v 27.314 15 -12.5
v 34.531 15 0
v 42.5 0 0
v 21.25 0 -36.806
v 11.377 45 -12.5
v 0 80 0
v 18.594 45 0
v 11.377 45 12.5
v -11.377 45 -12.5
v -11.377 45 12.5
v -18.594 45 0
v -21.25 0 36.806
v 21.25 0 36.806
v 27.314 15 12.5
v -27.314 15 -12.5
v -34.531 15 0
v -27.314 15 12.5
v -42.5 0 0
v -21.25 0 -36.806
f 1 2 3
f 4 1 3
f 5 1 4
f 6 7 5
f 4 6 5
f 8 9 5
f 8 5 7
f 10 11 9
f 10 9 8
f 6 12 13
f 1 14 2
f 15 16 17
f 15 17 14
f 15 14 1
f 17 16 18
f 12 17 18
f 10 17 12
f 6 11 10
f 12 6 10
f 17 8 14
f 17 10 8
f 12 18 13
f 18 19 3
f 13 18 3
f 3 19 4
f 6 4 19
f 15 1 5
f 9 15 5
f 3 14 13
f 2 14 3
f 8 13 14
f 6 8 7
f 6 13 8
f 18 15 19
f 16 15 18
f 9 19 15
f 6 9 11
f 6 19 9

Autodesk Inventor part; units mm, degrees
ref_plane "YZ Plane" through (0, 0, 0) normal (1, 0, 0) x (0, 1, 0)
ref_plane "XZ Plane" through (0, 0, 0) normal (0, 1, 0) x (-1, 0, 0)
ref_plane "XY Plane" through (0, 0, 0) normal (0, 0, 1) x (1, 0, 0)
sketch "Эскиз1" plane through (0, 0, 0) normal (0, 1, 0) x (-1, 0, 0)
  line L0 (42.5, 0) -> (21.25, -36.8061)
  line L1 (21.25, -36.8061) -> (-21.25, -36.8061)
  line L2 (-21.25, -36.8061) -> (-42.5, 0)
  line L3 (-42.5, 0) -> (-21.25, 36.8061)
  line L4 (-21.25, 36.8061) -> (21.25, 36.8061)
  line L5 (21.25, 36.8061) -> (42.5, 0)
  point P0 (0, 0)
  point P1 (0, 0)
  dimension "d0" = 85
sketch "Эскиз2" plane through (0, 0, 0) normal (1, 0, 0) x (0, 1, 0)
  point P0 (0, 0)
  point P1 (80, 0)
  dimension "d1" = 80
loft "Лофт1" add profiles "Эскиз1" section 2 point at (0, 80, 0)
sketch "Эскиз3" plane through (0, 0, 0) normal (1, 0, 0) x (0, 1, 0)
  line L0 (15, -12.5) -> (45, -12.5)
  line L1 (45, -12.5) -> (45, 12.5)
  line L2 (45, 12.5) -> (15, 12.5)
  line L3 (15, 12.5) -> (15, -12.5)
  line L4 (0, 0) -> (80, 0) projected
  line L5 (15, -12.5) -> (45, 12.5) construction
  line L6 (45, -12.5) -> (15, 12.5) construction
  line L7 (0, 0) -> (0, 36.8061) projected
  point P0 (30, 0)
  dimension "d6" = 30
  dimension "d7" = 25
  dimension "d8" = 15
extrude "Выдавливание1" cut sketch "Эскиз3" along normal through all both and the other way through all
properties part number "Пирамида"
